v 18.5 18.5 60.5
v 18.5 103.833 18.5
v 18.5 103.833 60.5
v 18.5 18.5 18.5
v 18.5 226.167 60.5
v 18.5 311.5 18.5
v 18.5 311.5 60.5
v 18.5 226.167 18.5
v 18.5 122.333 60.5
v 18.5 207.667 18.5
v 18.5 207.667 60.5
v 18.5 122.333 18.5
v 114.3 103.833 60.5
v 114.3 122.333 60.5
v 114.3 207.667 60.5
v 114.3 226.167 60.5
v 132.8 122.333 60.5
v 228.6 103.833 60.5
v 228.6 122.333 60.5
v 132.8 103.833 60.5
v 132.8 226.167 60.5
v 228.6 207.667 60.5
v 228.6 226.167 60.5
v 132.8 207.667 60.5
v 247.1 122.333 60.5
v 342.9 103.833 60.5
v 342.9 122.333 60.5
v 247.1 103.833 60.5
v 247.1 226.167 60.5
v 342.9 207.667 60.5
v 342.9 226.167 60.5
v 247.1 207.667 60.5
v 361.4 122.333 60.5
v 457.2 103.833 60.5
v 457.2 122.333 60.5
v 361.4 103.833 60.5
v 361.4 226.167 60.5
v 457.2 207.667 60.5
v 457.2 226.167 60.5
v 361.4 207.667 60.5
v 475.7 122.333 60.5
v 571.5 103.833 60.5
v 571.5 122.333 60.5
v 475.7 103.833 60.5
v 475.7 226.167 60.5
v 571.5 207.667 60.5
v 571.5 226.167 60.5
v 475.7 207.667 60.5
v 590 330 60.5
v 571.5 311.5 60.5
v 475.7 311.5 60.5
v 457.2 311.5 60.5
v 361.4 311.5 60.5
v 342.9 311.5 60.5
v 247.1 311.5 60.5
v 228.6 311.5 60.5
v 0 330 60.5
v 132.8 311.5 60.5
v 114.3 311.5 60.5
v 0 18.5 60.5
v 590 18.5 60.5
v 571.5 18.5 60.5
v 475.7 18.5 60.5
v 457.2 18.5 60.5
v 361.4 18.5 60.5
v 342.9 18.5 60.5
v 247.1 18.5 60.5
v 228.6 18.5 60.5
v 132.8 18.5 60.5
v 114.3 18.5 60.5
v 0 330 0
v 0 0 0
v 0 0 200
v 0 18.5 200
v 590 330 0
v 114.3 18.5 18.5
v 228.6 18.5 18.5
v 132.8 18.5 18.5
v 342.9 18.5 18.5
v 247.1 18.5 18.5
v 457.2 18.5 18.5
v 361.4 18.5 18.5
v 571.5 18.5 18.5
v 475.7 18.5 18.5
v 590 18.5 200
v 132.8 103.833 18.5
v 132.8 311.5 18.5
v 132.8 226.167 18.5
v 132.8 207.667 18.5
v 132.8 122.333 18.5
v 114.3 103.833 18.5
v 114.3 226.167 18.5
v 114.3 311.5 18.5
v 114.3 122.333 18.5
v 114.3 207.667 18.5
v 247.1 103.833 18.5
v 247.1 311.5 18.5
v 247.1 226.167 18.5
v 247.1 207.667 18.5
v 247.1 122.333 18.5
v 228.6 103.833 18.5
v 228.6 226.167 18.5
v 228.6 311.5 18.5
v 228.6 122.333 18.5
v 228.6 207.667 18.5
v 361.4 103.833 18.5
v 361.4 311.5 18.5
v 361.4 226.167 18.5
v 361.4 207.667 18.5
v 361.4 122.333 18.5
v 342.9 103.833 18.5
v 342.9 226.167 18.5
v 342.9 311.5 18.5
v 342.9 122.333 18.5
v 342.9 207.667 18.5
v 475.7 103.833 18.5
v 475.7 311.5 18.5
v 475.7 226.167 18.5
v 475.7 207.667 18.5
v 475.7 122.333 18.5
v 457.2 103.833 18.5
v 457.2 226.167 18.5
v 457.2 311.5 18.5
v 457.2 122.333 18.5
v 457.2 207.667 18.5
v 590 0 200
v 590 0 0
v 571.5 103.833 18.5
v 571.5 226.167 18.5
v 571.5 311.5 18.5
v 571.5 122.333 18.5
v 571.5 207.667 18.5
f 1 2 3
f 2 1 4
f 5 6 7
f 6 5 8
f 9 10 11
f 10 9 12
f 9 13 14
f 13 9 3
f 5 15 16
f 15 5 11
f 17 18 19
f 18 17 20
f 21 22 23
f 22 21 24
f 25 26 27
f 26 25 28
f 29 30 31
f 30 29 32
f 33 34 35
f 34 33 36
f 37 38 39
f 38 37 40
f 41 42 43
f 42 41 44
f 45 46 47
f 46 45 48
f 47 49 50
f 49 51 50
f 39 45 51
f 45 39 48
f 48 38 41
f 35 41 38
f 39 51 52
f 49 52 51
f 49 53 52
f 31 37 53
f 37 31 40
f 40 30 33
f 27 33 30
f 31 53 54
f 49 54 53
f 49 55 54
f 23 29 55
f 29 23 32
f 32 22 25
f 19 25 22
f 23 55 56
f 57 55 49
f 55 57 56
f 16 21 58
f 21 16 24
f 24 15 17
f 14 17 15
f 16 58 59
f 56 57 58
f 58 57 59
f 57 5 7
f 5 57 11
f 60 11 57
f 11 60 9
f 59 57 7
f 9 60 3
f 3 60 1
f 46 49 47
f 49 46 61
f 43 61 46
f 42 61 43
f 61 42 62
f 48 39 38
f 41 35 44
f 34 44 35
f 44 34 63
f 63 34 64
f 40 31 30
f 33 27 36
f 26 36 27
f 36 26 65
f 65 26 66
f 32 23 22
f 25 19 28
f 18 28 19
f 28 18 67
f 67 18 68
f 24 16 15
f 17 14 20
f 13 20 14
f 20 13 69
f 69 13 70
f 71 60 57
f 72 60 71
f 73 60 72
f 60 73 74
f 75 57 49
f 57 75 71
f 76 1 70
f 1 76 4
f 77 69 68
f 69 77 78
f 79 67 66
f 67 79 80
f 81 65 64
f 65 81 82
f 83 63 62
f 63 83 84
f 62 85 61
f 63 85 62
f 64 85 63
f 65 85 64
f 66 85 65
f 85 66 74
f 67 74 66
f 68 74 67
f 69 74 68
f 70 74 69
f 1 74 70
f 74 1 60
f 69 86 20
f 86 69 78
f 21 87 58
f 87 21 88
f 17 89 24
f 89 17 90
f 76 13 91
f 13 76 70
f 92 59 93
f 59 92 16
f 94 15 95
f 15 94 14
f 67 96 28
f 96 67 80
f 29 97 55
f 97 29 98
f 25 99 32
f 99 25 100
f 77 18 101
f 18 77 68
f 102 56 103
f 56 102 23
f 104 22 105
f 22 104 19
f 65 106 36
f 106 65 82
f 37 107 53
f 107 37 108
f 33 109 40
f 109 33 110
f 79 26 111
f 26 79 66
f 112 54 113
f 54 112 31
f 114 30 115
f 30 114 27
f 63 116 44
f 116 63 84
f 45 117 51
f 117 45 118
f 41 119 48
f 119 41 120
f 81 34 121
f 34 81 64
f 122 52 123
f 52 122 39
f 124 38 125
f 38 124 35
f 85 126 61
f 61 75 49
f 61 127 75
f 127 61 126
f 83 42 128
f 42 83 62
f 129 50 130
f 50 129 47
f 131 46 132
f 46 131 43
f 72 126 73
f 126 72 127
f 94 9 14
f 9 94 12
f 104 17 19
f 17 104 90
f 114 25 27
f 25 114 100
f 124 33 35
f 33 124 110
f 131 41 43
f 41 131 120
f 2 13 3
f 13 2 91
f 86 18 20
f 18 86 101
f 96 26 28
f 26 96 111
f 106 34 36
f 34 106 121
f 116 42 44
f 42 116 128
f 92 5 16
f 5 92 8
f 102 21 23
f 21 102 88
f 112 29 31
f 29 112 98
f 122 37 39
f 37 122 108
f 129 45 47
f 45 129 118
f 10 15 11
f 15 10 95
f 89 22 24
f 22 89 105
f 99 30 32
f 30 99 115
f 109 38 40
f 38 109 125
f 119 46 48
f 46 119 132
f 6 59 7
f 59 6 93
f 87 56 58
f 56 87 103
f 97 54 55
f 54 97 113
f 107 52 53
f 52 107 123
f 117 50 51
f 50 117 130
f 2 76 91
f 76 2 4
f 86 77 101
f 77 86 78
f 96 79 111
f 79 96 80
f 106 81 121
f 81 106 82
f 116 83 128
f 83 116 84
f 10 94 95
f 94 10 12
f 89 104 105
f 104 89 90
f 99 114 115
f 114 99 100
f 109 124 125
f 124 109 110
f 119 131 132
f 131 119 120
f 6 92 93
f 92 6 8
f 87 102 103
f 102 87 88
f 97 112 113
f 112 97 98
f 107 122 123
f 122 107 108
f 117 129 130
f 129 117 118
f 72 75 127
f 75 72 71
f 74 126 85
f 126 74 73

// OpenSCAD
dikte =18.5;
lengte = 590;
hoogte = 330;
diepte = 200;
aantalSteunVerticaal = 5;
aantalSteunHorizontaal = 3;

diepteInfrezing = 8;
hoogteSteun = 50;

//explode();
rolluikkasten();
//horizontaalSteun();
//verticaalSteun();

module explode(){
    translate([0,hoogte*2,0]){
difference(){
  square ([lengte,hoogte],center = false);
projection(cut=true) rolluikkastenExplode();
}
translate([0, (-diepte) -50,0]){
 
projection(cut=true) onderplaat();

  
}
}
  
//horizontaal   
for ( i = [0 :hoogteSteun +20: hoogteSteun *aantalSteunHorizontaal ] )
{
    translate([0,-i,0]){
        projection (cut=true) horizontaalSteun();
}
}

//verticaal
for ( i = [0 :hoogte+50:  (hoogte +50)* aantalSteunVerticaal ] )
{
translate([hoogte + i, 100, 0]){
rotate([0,0,90]){
projection (cut= true) verticaalSteun();
}
}
}
}
 module rolluikkasten(){
        
// difference(){
cube([lengte,hoogte,dikte], center=false);
translate([0,0,dikte]){
cube([lengte,dikte,diepte-dikte], center=false);
}

for ( i = [0 :  (lengte-dikte)/aantalSteunVerticaal: lengte] )
{
    translate([i,dikte,dikte-diepteInfrezing]){
cube([dikte,hoogte-dikte,hoogteSteun], center=false);
}
}
for ( i = [0 :  (hoogte-dikte)/aantalSteunHorizontaal: hoogte] )
{

 translate([0,i,dikte-diepteInfrezing]){
cube([lengte,dikte,hoogteSteun], center=false);
}
}

{   
//}
}
}

module rolluikkastenExplode(){

 difference(){
cube([lengte,hoogte,dikte], center=false);
translate([0,0,dikte]){
cube([lengte,dikte,diepte-dikte], center=false);
}

for ( i = [0 :  (lengte-dikte)/aantalSteunVerticaal: lengte] )
{
    translate([i,0,0]){
cube([dikte,hoogte,hoogteSteun], center=false);
}
}
for ( i = [0 :  (hoogte-dikte)/aantalSteunHorizontaal: hoogte] )
{

 translate([0,i,0]){
cube([lengte,dikte,hoogteSteun], center=false);
}
}

{   
}
}
}
module horizontaalSteun(){

   
 difference(){
        
 translate([0,0,0]){
cube([lengte,hoogteSteun,dikte], center=false);

} 

for ( i = [0 :  (lengte-dikte)/aantalSteunVerticaal: lengte] )
{
    translate([i,0,0]){
cube([dikte,hoogteSteun/2,hoogte-dikte,], center=false);

}

}
}
}

module verticaalSteun(){

   
 difference(){
translate([0,diepteInfrezing,0]){
cube([hoogteSteun,hoogte-diepteInfrezing,dikte], center=false);
}
for ( i = [0 :  (hoogte-dikte)/aantalSteunHorizontaal: hoogte] )
{

 translate([0,i,0]){
cube([hoogteSteun/2,dikte,dikte*2], center=false);
     
}
}


}
}

module onderplaat(){

   
 difference(){
        
 translate([0,0,0]){
cube([lengte,diepte,dikte], center=false);

} 

for ( i = [0 :  (lengte-dikte)/aantalSteunVerticaal: lengte] )
{
    translate([i,0,0]){
cube([dikte,hoogteSteun/2,hoogte-dikte], center=false);

}

}
}
}
